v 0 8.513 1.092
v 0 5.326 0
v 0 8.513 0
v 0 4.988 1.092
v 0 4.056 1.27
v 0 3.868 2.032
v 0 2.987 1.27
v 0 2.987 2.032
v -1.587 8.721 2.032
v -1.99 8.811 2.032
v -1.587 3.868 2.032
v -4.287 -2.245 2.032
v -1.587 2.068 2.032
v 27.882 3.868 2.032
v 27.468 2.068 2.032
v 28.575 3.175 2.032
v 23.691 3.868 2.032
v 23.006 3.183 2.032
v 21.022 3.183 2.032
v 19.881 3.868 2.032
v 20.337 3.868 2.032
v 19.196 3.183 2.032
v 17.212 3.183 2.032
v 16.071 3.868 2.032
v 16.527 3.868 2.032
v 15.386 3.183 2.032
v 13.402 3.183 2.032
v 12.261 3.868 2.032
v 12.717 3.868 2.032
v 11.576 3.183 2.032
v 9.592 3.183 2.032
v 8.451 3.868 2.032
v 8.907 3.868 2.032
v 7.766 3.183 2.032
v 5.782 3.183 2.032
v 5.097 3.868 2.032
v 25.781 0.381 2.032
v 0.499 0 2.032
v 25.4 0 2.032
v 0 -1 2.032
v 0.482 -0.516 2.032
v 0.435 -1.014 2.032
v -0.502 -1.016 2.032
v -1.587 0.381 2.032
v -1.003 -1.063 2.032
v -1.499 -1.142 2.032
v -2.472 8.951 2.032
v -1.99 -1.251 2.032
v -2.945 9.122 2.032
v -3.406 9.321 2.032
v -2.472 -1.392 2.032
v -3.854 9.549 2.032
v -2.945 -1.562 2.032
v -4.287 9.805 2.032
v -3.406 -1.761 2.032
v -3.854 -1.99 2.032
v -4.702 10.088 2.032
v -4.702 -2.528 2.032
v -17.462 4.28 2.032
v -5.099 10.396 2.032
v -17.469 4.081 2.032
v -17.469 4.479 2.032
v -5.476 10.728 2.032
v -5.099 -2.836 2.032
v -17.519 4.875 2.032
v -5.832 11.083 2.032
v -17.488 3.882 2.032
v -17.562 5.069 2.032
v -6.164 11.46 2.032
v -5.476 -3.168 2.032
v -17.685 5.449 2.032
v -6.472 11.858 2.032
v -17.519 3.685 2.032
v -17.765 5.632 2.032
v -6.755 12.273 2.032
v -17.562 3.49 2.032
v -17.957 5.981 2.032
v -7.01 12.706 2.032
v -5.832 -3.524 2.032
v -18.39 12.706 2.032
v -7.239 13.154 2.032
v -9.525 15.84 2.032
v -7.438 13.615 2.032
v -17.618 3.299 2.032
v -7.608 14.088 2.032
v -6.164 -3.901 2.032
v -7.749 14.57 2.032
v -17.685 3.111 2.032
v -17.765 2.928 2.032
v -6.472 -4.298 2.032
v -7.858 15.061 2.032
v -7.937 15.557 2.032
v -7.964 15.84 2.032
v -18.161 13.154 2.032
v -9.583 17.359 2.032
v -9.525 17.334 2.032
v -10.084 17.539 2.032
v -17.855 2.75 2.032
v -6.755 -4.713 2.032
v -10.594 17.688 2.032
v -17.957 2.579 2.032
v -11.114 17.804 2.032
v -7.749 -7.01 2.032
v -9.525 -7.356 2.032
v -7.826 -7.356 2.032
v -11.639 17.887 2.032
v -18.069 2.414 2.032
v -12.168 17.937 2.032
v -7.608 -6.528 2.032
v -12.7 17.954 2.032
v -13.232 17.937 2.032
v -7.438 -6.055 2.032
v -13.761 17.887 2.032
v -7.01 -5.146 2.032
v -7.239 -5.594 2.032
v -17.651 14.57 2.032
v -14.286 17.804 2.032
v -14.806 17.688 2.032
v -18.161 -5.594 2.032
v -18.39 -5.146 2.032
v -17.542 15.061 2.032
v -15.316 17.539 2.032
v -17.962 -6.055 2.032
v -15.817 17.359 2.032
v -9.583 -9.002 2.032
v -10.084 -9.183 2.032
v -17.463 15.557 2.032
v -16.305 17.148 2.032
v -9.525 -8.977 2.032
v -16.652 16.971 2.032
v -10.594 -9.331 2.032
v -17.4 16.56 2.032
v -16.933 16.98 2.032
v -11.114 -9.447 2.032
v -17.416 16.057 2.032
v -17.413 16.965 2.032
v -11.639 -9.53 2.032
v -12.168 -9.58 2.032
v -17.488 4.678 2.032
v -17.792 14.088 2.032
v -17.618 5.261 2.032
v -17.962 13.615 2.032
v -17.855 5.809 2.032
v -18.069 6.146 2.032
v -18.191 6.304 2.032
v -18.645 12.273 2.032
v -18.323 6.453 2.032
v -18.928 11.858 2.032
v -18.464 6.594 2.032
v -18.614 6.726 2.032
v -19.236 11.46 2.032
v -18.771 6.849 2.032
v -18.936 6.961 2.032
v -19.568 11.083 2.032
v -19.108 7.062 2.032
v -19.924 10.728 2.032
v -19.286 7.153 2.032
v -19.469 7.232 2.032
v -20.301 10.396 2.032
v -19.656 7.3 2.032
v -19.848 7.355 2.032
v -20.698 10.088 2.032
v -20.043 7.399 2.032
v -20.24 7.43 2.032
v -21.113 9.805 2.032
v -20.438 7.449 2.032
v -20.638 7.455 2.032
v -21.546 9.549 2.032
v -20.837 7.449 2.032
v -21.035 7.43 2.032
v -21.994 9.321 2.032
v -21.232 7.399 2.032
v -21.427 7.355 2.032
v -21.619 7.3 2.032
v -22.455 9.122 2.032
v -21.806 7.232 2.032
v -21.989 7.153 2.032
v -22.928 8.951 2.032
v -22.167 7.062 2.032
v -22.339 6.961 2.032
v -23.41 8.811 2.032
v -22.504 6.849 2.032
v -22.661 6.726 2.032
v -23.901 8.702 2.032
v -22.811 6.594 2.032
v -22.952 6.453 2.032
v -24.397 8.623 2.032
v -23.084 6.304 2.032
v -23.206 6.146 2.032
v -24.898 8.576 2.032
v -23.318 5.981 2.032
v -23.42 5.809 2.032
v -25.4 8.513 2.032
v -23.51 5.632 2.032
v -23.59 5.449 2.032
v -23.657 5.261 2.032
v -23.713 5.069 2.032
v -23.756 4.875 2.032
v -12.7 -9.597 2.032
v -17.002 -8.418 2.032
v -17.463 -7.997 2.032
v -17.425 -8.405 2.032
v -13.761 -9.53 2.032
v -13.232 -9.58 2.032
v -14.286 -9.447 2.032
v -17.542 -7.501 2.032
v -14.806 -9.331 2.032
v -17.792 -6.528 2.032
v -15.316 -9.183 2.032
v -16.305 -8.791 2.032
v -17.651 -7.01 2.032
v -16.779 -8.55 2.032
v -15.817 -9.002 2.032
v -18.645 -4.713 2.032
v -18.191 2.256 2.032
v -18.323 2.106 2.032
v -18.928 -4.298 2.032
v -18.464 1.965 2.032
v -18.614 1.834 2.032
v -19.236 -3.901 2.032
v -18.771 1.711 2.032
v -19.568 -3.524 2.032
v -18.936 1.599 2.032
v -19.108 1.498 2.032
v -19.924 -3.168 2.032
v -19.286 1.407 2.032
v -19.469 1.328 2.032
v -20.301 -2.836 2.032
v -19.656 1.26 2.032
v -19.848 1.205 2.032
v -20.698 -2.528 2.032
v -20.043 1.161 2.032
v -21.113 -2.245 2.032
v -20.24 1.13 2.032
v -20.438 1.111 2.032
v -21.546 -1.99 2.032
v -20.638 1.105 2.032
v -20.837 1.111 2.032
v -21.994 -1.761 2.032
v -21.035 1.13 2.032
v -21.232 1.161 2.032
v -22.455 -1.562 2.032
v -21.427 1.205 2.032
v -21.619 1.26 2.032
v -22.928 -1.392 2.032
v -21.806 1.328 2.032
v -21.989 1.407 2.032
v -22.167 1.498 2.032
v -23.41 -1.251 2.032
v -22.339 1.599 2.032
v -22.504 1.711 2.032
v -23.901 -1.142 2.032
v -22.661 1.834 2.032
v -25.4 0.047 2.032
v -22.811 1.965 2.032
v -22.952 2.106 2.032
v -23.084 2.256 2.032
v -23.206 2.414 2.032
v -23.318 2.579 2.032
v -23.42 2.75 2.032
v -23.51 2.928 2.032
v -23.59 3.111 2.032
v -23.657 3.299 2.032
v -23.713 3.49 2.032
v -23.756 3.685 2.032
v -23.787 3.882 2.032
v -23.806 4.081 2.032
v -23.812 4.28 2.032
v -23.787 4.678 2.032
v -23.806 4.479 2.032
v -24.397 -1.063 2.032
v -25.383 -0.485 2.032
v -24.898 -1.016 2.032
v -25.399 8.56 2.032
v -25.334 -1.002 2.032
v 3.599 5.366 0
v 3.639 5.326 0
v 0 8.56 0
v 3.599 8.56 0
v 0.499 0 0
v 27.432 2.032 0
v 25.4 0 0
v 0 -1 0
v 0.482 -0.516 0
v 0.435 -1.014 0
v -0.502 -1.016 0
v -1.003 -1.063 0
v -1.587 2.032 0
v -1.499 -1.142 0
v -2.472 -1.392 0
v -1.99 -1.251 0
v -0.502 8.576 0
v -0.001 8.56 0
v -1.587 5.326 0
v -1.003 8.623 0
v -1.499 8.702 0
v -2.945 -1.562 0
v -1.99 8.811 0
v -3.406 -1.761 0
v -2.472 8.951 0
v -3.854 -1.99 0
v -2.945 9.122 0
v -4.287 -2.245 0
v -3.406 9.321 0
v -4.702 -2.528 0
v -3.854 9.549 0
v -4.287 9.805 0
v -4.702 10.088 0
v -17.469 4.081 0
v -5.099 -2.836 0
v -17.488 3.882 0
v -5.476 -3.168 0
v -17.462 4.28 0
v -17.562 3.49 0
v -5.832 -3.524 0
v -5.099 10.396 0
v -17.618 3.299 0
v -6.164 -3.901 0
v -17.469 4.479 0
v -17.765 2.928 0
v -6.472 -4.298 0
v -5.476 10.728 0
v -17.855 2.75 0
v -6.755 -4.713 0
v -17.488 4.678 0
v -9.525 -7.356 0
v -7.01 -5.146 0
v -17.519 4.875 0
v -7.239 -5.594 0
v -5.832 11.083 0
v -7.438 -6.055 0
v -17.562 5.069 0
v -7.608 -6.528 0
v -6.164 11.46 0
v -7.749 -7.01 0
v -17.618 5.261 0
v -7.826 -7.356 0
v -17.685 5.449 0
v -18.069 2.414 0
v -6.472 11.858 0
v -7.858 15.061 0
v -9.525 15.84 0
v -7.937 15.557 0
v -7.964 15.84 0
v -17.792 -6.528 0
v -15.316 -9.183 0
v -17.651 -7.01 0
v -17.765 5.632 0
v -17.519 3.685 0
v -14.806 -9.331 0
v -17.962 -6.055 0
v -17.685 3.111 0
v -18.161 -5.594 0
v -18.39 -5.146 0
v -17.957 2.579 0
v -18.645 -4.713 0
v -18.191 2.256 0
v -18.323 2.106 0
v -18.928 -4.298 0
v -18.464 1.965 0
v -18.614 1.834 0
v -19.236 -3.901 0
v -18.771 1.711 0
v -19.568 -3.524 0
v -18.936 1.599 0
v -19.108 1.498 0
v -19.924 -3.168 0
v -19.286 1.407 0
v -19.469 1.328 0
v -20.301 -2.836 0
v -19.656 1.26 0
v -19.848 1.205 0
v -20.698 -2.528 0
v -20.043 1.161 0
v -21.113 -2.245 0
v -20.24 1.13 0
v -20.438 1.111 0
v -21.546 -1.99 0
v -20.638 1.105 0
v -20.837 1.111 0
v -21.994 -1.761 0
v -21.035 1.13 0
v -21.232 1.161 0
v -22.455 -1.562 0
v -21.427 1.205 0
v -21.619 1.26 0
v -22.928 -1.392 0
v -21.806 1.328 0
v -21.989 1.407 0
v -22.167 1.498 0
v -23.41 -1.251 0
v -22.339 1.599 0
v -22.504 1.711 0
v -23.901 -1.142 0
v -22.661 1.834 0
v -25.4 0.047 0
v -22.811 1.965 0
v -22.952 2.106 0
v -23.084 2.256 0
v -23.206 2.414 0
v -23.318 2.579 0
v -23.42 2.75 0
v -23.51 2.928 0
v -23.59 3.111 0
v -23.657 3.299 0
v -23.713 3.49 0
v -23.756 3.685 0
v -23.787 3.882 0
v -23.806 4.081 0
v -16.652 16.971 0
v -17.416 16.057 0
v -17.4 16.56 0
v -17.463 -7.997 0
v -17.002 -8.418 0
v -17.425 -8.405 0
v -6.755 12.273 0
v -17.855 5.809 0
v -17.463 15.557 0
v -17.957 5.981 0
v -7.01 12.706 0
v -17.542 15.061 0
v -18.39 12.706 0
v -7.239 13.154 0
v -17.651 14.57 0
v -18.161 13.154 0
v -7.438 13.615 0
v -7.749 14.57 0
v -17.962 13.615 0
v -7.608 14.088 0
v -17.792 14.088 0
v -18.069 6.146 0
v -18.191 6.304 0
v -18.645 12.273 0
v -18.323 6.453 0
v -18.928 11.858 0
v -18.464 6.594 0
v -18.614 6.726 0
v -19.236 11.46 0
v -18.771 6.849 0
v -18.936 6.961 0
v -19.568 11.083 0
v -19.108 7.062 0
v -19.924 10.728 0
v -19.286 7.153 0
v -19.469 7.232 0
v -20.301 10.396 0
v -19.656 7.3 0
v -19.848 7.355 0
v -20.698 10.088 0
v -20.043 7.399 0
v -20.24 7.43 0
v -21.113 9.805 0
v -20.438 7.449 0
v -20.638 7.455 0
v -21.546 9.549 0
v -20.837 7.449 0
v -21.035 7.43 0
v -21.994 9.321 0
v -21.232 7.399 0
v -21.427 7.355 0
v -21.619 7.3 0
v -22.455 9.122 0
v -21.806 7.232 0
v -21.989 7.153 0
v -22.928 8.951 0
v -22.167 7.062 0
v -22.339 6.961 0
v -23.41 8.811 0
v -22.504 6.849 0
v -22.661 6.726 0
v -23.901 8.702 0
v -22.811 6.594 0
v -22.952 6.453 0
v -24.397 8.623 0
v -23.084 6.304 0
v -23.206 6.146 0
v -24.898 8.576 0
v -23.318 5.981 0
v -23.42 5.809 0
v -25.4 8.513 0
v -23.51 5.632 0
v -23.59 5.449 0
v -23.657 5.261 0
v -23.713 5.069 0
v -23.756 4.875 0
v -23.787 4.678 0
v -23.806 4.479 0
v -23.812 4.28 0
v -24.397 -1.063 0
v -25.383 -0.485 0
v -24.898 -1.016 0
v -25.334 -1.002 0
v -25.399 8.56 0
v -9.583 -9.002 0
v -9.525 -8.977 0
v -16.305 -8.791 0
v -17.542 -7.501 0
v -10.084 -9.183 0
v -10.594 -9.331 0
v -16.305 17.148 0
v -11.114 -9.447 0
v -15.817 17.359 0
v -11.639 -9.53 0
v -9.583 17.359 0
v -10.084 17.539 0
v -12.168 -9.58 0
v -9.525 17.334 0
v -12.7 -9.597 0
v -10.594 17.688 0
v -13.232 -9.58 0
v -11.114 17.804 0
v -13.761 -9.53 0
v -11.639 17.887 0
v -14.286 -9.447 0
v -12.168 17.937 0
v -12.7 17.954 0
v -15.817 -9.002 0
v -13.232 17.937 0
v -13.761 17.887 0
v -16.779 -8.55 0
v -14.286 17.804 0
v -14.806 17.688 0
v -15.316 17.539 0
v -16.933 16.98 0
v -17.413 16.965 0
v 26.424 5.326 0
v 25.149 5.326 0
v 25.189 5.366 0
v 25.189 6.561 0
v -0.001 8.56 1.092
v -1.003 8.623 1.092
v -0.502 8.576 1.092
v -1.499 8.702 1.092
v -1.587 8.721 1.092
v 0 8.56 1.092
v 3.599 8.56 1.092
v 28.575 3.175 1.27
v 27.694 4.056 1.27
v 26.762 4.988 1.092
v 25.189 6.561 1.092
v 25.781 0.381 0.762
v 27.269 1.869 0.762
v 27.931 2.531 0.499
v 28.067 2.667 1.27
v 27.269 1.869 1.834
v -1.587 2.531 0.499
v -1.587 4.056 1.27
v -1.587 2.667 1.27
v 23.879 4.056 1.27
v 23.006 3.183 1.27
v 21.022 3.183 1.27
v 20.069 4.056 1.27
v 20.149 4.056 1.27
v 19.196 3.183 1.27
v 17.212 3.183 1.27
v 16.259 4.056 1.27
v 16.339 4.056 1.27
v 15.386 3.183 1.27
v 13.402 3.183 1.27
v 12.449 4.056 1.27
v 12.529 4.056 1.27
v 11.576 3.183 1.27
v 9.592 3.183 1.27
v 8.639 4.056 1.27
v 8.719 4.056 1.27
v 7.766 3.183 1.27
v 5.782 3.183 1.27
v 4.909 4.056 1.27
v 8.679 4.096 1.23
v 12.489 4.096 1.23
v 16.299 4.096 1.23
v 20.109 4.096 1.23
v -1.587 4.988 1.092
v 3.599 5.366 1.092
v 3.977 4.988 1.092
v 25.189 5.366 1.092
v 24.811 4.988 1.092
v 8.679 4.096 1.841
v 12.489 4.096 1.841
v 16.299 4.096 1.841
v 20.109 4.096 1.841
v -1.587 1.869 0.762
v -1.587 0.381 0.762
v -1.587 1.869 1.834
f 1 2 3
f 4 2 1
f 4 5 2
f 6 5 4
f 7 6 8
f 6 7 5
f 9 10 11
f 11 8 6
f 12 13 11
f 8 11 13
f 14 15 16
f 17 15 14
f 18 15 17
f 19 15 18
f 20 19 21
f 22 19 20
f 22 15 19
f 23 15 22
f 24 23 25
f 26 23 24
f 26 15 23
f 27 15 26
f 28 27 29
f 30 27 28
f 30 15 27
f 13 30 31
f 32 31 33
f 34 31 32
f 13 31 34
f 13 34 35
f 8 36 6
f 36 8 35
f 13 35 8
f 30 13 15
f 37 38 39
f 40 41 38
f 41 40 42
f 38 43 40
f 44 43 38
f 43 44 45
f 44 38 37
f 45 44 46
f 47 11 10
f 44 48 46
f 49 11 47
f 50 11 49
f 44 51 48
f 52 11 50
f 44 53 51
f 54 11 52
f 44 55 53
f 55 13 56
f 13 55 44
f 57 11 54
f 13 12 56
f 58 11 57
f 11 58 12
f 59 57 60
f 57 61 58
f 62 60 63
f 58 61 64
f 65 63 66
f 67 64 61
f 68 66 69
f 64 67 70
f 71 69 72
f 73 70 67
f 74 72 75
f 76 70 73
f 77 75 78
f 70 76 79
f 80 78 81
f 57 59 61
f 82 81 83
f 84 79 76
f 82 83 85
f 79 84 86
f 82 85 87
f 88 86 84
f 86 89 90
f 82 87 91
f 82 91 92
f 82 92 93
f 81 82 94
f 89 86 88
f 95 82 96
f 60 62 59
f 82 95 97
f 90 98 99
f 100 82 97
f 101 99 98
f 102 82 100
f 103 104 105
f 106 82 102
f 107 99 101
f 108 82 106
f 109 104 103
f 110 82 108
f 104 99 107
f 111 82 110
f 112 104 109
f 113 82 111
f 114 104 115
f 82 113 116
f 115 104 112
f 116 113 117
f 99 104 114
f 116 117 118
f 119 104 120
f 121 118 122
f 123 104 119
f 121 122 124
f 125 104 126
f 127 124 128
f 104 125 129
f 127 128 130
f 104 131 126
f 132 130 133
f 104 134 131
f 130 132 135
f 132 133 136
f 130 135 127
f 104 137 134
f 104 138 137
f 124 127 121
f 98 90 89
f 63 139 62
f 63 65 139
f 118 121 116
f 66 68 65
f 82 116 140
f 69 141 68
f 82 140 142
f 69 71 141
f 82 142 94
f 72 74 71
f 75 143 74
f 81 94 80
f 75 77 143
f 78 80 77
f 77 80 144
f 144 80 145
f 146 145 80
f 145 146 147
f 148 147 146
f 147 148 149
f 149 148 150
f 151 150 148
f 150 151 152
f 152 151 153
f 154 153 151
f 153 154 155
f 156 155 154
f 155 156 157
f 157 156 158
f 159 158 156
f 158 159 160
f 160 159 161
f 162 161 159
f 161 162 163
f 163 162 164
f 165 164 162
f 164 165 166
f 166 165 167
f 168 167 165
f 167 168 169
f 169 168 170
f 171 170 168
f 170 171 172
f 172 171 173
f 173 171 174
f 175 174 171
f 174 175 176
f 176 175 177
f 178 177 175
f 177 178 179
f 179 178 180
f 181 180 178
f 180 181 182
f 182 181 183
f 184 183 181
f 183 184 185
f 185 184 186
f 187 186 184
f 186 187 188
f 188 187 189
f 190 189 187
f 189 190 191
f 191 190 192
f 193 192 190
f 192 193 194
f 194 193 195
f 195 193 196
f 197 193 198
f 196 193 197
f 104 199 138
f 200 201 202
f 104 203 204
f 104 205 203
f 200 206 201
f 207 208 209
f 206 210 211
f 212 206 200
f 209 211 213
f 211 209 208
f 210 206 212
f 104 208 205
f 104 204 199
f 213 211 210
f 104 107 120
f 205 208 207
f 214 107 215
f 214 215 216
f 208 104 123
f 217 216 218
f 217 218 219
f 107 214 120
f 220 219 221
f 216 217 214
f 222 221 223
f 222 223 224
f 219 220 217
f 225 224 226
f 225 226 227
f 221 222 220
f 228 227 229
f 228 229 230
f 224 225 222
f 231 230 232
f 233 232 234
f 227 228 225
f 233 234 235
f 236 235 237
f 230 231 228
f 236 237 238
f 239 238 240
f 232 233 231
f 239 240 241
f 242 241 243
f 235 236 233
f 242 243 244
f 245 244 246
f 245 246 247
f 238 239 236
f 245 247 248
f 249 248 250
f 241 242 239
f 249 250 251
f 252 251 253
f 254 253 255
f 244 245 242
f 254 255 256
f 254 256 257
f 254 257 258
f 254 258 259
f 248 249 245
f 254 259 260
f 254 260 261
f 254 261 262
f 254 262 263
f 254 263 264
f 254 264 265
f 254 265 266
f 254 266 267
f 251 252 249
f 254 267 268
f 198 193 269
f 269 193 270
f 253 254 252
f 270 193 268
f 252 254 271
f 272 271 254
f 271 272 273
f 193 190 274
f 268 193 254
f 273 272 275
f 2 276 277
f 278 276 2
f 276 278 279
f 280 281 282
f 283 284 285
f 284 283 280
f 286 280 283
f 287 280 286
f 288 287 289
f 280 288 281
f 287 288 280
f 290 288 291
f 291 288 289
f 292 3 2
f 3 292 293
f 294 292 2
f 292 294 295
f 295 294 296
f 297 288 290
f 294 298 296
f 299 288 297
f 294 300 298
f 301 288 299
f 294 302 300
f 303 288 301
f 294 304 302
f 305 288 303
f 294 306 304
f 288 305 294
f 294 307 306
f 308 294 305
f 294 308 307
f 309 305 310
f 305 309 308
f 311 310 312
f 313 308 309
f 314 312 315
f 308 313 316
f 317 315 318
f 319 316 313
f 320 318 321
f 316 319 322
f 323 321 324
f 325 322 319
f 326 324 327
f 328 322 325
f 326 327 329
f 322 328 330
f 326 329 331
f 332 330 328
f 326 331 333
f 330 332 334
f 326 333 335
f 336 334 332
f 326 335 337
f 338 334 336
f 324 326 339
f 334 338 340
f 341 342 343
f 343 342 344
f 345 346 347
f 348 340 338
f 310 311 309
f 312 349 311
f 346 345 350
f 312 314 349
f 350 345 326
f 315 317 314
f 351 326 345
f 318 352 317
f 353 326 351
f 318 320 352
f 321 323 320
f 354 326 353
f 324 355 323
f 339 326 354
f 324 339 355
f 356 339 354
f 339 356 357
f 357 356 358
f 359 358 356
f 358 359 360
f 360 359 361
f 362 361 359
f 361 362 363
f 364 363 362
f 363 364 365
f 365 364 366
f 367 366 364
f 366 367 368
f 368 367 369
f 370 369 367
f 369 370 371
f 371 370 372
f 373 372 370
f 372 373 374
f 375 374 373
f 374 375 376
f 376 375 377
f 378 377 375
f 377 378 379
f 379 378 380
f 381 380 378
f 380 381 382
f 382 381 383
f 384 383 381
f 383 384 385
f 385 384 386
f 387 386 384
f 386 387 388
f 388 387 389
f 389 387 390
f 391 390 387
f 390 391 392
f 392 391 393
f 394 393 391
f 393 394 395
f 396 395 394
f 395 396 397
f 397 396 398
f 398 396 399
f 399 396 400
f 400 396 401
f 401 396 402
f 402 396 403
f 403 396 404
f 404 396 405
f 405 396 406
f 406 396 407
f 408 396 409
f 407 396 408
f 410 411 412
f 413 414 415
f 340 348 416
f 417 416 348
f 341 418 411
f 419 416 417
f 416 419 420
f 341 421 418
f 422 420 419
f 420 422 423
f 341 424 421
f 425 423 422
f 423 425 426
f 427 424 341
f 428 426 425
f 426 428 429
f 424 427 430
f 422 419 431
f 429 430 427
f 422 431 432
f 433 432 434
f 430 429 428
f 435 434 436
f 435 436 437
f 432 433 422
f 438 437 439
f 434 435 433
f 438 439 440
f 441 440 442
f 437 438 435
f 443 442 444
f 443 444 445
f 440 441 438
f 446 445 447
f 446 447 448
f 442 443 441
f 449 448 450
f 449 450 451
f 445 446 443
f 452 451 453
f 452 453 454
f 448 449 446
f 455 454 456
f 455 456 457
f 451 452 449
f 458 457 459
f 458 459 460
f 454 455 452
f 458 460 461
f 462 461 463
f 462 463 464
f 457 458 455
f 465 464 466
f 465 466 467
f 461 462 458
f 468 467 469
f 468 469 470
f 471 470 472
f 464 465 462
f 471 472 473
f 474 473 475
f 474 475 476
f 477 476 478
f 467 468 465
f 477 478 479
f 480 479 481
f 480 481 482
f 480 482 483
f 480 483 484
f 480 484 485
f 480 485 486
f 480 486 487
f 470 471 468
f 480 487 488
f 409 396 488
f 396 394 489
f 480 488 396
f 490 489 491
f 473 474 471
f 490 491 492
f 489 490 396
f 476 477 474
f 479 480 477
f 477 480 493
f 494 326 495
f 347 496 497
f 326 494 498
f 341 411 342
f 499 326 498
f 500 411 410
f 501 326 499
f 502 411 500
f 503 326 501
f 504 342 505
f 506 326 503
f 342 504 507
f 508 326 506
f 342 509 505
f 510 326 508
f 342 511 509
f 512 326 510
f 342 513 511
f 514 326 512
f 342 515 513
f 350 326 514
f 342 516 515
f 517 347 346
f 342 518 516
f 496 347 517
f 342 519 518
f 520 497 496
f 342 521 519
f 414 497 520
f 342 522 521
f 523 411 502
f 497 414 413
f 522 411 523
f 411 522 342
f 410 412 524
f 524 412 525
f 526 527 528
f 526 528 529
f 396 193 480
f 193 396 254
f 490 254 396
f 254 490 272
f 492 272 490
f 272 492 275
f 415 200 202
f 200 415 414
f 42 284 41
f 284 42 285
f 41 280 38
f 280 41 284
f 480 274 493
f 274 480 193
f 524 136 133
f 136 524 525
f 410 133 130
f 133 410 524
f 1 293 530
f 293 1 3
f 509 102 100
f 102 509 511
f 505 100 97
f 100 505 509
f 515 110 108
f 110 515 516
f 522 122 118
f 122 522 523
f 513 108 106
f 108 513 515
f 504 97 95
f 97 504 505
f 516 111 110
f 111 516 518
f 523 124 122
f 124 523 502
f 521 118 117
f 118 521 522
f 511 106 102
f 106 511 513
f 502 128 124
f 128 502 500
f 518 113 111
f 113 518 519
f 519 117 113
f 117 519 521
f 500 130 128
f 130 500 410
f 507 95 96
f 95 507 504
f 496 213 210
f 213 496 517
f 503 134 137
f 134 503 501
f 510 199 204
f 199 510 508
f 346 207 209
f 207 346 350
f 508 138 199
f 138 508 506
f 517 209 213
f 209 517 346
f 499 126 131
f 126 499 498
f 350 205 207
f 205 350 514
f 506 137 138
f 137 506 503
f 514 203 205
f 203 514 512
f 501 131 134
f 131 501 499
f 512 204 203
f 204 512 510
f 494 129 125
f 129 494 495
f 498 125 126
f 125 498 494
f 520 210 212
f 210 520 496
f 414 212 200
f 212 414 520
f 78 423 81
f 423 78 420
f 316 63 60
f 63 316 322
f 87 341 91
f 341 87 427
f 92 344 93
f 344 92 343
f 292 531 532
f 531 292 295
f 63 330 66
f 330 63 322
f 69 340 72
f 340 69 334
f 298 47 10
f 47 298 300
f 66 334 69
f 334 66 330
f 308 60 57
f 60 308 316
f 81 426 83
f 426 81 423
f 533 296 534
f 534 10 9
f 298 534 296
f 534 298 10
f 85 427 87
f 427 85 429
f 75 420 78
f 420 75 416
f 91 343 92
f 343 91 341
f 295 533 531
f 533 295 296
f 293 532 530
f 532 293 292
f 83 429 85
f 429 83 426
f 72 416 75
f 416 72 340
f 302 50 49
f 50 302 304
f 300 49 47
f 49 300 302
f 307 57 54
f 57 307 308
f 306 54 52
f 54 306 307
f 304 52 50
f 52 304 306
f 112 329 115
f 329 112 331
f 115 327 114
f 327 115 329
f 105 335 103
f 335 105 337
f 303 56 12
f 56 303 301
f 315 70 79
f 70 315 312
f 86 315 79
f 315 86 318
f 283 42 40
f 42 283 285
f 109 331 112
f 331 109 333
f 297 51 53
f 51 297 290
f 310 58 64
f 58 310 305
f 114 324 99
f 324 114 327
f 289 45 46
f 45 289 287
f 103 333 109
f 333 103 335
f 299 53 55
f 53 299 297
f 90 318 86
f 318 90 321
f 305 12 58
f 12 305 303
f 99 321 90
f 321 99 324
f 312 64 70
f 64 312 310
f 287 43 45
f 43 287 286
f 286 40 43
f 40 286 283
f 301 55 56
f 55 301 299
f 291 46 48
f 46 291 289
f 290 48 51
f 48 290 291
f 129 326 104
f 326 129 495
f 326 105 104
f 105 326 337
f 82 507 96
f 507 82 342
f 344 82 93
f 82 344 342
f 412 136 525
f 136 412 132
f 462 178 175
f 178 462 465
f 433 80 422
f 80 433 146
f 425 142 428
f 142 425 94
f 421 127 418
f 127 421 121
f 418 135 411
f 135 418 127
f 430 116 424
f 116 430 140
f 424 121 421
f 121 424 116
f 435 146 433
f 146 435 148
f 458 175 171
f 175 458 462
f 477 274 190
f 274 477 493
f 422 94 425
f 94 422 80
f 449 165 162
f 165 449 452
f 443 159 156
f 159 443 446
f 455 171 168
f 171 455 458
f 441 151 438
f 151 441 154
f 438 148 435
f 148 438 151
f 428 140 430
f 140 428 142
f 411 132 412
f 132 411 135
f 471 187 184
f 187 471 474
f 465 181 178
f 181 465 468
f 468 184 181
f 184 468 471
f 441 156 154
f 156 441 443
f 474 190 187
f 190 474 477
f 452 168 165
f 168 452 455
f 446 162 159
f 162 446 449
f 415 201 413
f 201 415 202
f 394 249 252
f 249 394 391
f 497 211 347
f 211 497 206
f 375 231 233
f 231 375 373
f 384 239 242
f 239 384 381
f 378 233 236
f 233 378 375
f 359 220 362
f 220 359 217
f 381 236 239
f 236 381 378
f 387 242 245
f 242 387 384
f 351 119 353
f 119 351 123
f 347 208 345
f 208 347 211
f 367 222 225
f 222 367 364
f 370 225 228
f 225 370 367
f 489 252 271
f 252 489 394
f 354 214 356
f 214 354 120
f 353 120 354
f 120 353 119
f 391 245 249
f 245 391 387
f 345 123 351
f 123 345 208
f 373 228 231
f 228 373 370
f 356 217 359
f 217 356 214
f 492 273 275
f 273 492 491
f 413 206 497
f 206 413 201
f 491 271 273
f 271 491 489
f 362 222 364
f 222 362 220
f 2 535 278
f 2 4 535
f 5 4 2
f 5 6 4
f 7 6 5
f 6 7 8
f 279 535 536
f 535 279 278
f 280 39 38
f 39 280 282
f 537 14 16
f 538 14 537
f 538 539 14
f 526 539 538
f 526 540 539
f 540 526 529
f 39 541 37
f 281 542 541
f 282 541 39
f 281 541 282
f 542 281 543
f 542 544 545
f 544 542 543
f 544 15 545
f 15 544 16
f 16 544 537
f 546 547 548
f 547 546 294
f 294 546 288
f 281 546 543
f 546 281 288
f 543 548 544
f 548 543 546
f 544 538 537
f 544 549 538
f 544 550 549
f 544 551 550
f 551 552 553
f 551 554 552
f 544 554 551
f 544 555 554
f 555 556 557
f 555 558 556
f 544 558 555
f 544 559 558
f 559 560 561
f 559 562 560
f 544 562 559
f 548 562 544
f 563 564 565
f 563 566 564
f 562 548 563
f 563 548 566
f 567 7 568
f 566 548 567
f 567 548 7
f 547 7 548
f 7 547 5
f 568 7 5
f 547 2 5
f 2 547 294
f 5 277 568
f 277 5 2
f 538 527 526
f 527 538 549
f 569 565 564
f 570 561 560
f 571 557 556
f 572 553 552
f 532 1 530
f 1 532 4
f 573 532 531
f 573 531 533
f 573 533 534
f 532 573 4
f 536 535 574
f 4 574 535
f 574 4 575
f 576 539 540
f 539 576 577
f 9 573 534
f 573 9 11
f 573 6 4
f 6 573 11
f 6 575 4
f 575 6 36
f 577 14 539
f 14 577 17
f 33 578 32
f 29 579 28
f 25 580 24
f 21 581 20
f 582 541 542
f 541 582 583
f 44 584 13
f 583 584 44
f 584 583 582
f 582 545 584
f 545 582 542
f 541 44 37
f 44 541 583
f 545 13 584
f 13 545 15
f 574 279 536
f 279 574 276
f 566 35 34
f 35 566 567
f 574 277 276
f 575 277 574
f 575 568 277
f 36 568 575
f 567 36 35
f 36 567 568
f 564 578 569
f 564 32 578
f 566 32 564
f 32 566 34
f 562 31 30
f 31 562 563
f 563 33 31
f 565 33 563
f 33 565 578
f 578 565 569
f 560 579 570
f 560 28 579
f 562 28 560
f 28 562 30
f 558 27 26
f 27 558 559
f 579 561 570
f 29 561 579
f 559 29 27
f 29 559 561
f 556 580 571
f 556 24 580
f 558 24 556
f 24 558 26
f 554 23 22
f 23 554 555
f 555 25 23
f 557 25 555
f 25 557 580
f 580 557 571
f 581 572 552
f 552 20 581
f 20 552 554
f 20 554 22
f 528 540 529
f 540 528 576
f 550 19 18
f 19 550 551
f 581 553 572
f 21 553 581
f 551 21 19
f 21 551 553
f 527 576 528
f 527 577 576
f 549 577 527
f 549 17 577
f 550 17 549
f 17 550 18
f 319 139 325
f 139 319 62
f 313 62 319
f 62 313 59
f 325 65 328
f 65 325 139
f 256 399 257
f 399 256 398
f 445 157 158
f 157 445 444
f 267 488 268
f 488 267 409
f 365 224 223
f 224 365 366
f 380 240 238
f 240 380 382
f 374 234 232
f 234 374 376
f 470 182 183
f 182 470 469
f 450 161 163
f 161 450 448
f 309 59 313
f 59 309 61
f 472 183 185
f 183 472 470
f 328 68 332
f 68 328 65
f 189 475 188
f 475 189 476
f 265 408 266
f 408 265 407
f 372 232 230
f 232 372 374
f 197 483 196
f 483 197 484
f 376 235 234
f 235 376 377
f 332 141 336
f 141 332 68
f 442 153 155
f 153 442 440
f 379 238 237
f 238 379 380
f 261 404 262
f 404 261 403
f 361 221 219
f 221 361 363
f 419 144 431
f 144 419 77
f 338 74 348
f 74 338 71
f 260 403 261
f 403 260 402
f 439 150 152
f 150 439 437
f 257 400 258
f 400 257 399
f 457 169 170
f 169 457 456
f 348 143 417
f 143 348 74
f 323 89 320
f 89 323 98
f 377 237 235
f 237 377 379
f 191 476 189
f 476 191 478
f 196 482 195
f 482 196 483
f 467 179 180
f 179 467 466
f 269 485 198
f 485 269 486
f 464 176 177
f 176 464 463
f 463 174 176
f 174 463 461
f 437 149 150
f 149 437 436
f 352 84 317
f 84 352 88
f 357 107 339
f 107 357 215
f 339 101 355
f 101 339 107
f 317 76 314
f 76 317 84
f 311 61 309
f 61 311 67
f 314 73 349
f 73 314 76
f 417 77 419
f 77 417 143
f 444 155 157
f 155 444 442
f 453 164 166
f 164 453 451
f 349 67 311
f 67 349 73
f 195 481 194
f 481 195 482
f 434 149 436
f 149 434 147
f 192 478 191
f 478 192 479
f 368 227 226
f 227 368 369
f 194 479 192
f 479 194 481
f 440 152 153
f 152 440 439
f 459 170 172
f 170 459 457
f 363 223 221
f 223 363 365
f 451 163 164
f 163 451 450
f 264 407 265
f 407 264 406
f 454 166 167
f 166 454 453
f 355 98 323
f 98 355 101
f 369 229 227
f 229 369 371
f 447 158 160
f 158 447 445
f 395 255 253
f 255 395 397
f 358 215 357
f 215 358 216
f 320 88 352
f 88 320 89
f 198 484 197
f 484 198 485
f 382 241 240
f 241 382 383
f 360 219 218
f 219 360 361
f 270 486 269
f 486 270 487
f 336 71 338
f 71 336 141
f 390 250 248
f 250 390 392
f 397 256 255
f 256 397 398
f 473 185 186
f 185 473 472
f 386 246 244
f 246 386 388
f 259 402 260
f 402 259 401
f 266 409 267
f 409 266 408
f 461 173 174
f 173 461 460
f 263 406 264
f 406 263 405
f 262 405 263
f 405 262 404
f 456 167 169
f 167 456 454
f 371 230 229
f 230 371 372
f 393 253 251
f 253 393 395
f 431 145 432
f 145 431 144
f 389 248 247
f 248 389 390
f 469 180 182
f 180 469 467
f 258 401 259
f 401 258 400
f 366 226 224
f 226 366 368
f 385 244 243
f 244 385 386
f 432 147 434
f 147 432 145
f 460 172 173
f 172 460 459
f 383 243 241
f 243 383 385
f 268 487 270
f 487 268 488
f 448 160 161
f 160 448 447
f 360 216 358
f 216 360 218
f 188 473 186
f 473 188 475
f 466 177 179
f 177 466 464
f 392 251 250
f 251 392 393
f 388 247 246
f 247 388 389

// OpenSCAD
//
// Generate a duplicate of a Kwikset KW1 key by editing the last line of the file
// and entering in the key code of the lock.  If you don't know the key code,
// you can measure the key and compare the numbers at:
// http://web.archive.org/web/20050217020917fw_/http://dlaco.com/spacing/tips.htm
//
// This work is licensed under a Creative Commons Attribution 3.0 Unported License.

// Since the keys and locks I have were all designed in imperial units, the
// constants in this file will be defined in inches.  The mm function
// allows us to retain the proper size for exporting a metric STL.
function mm(i) = i*25.4;
$fn=100;

module rounded(size, r) {
	 
    union() {
	
     *   translate([r, 0, 0]) cube([size[0]-2*r, size[1], size[2]]);
       translate([0, r, 0]) cube([size[0], size[1]-2*r, size[2]]);
        translate([r, r, 0]) cylinder(h=size[2], r=r);
        translate([size[0]-r, r, 0]) cylinder(h=size[2], r=(r+.5));
        translate([r, size[1]-r, 0]) cylinder(h=size[2], r=(r));
        translate([size[0]-r, size[1]-r, 0]) cylinder(h=size[2], r=r);
		translate([(mm(1))/2, mm(.205) + ((mm(1))/2), 0]) cylinder(h= size[2], r=r);
		translate([(mm(1))/2, mm(.287), 0]) cylinder(h= size[2], r=r);
	  }
}

module bit() {
    w = mm(1/4);
    difference() {
        translate([-w/2, 0, 0]) cube([w, mm(1), w]);
        translate([-mm(5/128), 0, 0]) rotate([0, 0, 135]) cube([w, w, w]);
        translate([mm(5/128), 0, 0]) rotate([0, 0, -45]) cube([w, w, w]);
    }
}

// Kwikset KW1 5 pin key.  The measurements are mostly guesses based on reverse
// engineering some keys I have and some publicly available information.
module kw1(bits) {
    // You may need to adjust these to fit your specific printer settings
    thickness = mm(0.080);
    length = mm(9/8);
    width = mm(.337);
    
    shoulder = mm(.247);
    pin_spacing = mm(.15);
    depth_inc = mm(.023);
    
    // A fudge factor.  Printing with your average RepRap, the bottom layer is
    // going to be squeezed larger than you want. You can make the pins
    // go slighly deeper by a fudge amount to make up for it if you aren't
    // adjusting for it elsewhere like Skeinforge or in your firmware.
    fudge = 0.5;
    
    // Handle size
    h_l = mm(1);
    h_w = mm(1);
    h_d = mm(1/16);
    difference() {
        // blade and key handle
        union() {
            translate([-h_l, -h_w/2 + width/2, 0])  difference() {
                rounded([h_l, h_w, thickness], mm(1/3));
                // Round out edge of bow to blade            
                translate([h_l, h_w/2 + width/2 + 8, 0]) cylinder(h=thickness, r=8);
                translate([h_l, h_w/2 - width/2 - 9 , 0]) cylinder(h=thickness, r=8);
			   translate([(5*h_l)/8, -3, 0])  cube([2*thickness, 2*thickness, thickness]);
			   translate([(5*h_l)/8, 3 + width + ( h_l/2), 0])  cube([2*thickness, 2*thickness, thickness]);
			     *  translate([(9*h_l)/30, 3 + width + ( h_l/2), 0])  cube([(2*thickness)/3, 2*thickness, thickness]);
                translate([0 , h_w/2 + width/2 + 8, 0]) cylinder(h=thickness, r=8);
                translate([0, h_w/2 - width/2 - 9 , 0]) cylinder(h=thickness, r=8);
		       }

            // cut a little off the tip to avoid going too long
            cube([length, width, thickness]);
        }
        
        // chamfer the tip
        translate([length, mm(1/8), 0]) {
            rotate([0, 0, 45]) cube([10, 10, thickness]);
            rotate([0, 0, 225]) cube([10, 10, thickness]);
        }
        
        // put in a hole for keychain use
        translate([-h_l + mm(3/16), width/2, 0]) cylinder(h=thickness, r=mm(1/8));
        
        // cut the channels in the key.  designed more for printability than accuracy
        union() {
            translate([-h_d, mm(.105), mm(.025)]) rotate([225, 0, 0]) cube([length + h_d, width, width]);
            translate([-h_d, mm(.105), mm(.05)]) rotate([260, 0, 0]) cube([length + h_d, thickness/2, mm(1/32)]);
            translate([-h_d, mm(.105), 0]) cube([length + h_d, mm(7/128), mm(.05)]);
            translate([-h_d, mm(.105) + mm(7/128), mm(.05)]) rotate([225, 0, 0]) cube([length + h_d, mm(3/64), thickness]);
        }
        
        translate([-h_d, width - mm(9/64), mm(.043)]) {
            cube([length + h_d, width - (width - mm(10/64)), thickness]);
            rotate([50, 0, 0]) cube([length + h_d, width, thickness]);
        }
        
        union() {
            translate([-h_d, mm(0.015), mm(.03)]) cube([length + h_d, mm(15/256), thickness]);
            translate([-h_d, mm(0.015) + mm(13/256), thickness - mm(1/64)]) rotate([45, 0, 0]) cube([length + h_d, mm(1/16), mm(1/16)]);
        }
        
        // Do the actual bitting
        for (b = [0:4]) {
            // KW1 doesn't have a 0 value and instead has 1 start around .008" deep
            translate([shoulder + fudge + b*pin_spacing, width - mm(.008) - (bits[b] - 1)*depth_inc - fudge, 0]) bit();
        }
    }
}

// This sample key goes to a lock that is sitting disassembled on my desk
// Flip the key over for easy printing
kw1([9, 9, 9, 9, 9]);
